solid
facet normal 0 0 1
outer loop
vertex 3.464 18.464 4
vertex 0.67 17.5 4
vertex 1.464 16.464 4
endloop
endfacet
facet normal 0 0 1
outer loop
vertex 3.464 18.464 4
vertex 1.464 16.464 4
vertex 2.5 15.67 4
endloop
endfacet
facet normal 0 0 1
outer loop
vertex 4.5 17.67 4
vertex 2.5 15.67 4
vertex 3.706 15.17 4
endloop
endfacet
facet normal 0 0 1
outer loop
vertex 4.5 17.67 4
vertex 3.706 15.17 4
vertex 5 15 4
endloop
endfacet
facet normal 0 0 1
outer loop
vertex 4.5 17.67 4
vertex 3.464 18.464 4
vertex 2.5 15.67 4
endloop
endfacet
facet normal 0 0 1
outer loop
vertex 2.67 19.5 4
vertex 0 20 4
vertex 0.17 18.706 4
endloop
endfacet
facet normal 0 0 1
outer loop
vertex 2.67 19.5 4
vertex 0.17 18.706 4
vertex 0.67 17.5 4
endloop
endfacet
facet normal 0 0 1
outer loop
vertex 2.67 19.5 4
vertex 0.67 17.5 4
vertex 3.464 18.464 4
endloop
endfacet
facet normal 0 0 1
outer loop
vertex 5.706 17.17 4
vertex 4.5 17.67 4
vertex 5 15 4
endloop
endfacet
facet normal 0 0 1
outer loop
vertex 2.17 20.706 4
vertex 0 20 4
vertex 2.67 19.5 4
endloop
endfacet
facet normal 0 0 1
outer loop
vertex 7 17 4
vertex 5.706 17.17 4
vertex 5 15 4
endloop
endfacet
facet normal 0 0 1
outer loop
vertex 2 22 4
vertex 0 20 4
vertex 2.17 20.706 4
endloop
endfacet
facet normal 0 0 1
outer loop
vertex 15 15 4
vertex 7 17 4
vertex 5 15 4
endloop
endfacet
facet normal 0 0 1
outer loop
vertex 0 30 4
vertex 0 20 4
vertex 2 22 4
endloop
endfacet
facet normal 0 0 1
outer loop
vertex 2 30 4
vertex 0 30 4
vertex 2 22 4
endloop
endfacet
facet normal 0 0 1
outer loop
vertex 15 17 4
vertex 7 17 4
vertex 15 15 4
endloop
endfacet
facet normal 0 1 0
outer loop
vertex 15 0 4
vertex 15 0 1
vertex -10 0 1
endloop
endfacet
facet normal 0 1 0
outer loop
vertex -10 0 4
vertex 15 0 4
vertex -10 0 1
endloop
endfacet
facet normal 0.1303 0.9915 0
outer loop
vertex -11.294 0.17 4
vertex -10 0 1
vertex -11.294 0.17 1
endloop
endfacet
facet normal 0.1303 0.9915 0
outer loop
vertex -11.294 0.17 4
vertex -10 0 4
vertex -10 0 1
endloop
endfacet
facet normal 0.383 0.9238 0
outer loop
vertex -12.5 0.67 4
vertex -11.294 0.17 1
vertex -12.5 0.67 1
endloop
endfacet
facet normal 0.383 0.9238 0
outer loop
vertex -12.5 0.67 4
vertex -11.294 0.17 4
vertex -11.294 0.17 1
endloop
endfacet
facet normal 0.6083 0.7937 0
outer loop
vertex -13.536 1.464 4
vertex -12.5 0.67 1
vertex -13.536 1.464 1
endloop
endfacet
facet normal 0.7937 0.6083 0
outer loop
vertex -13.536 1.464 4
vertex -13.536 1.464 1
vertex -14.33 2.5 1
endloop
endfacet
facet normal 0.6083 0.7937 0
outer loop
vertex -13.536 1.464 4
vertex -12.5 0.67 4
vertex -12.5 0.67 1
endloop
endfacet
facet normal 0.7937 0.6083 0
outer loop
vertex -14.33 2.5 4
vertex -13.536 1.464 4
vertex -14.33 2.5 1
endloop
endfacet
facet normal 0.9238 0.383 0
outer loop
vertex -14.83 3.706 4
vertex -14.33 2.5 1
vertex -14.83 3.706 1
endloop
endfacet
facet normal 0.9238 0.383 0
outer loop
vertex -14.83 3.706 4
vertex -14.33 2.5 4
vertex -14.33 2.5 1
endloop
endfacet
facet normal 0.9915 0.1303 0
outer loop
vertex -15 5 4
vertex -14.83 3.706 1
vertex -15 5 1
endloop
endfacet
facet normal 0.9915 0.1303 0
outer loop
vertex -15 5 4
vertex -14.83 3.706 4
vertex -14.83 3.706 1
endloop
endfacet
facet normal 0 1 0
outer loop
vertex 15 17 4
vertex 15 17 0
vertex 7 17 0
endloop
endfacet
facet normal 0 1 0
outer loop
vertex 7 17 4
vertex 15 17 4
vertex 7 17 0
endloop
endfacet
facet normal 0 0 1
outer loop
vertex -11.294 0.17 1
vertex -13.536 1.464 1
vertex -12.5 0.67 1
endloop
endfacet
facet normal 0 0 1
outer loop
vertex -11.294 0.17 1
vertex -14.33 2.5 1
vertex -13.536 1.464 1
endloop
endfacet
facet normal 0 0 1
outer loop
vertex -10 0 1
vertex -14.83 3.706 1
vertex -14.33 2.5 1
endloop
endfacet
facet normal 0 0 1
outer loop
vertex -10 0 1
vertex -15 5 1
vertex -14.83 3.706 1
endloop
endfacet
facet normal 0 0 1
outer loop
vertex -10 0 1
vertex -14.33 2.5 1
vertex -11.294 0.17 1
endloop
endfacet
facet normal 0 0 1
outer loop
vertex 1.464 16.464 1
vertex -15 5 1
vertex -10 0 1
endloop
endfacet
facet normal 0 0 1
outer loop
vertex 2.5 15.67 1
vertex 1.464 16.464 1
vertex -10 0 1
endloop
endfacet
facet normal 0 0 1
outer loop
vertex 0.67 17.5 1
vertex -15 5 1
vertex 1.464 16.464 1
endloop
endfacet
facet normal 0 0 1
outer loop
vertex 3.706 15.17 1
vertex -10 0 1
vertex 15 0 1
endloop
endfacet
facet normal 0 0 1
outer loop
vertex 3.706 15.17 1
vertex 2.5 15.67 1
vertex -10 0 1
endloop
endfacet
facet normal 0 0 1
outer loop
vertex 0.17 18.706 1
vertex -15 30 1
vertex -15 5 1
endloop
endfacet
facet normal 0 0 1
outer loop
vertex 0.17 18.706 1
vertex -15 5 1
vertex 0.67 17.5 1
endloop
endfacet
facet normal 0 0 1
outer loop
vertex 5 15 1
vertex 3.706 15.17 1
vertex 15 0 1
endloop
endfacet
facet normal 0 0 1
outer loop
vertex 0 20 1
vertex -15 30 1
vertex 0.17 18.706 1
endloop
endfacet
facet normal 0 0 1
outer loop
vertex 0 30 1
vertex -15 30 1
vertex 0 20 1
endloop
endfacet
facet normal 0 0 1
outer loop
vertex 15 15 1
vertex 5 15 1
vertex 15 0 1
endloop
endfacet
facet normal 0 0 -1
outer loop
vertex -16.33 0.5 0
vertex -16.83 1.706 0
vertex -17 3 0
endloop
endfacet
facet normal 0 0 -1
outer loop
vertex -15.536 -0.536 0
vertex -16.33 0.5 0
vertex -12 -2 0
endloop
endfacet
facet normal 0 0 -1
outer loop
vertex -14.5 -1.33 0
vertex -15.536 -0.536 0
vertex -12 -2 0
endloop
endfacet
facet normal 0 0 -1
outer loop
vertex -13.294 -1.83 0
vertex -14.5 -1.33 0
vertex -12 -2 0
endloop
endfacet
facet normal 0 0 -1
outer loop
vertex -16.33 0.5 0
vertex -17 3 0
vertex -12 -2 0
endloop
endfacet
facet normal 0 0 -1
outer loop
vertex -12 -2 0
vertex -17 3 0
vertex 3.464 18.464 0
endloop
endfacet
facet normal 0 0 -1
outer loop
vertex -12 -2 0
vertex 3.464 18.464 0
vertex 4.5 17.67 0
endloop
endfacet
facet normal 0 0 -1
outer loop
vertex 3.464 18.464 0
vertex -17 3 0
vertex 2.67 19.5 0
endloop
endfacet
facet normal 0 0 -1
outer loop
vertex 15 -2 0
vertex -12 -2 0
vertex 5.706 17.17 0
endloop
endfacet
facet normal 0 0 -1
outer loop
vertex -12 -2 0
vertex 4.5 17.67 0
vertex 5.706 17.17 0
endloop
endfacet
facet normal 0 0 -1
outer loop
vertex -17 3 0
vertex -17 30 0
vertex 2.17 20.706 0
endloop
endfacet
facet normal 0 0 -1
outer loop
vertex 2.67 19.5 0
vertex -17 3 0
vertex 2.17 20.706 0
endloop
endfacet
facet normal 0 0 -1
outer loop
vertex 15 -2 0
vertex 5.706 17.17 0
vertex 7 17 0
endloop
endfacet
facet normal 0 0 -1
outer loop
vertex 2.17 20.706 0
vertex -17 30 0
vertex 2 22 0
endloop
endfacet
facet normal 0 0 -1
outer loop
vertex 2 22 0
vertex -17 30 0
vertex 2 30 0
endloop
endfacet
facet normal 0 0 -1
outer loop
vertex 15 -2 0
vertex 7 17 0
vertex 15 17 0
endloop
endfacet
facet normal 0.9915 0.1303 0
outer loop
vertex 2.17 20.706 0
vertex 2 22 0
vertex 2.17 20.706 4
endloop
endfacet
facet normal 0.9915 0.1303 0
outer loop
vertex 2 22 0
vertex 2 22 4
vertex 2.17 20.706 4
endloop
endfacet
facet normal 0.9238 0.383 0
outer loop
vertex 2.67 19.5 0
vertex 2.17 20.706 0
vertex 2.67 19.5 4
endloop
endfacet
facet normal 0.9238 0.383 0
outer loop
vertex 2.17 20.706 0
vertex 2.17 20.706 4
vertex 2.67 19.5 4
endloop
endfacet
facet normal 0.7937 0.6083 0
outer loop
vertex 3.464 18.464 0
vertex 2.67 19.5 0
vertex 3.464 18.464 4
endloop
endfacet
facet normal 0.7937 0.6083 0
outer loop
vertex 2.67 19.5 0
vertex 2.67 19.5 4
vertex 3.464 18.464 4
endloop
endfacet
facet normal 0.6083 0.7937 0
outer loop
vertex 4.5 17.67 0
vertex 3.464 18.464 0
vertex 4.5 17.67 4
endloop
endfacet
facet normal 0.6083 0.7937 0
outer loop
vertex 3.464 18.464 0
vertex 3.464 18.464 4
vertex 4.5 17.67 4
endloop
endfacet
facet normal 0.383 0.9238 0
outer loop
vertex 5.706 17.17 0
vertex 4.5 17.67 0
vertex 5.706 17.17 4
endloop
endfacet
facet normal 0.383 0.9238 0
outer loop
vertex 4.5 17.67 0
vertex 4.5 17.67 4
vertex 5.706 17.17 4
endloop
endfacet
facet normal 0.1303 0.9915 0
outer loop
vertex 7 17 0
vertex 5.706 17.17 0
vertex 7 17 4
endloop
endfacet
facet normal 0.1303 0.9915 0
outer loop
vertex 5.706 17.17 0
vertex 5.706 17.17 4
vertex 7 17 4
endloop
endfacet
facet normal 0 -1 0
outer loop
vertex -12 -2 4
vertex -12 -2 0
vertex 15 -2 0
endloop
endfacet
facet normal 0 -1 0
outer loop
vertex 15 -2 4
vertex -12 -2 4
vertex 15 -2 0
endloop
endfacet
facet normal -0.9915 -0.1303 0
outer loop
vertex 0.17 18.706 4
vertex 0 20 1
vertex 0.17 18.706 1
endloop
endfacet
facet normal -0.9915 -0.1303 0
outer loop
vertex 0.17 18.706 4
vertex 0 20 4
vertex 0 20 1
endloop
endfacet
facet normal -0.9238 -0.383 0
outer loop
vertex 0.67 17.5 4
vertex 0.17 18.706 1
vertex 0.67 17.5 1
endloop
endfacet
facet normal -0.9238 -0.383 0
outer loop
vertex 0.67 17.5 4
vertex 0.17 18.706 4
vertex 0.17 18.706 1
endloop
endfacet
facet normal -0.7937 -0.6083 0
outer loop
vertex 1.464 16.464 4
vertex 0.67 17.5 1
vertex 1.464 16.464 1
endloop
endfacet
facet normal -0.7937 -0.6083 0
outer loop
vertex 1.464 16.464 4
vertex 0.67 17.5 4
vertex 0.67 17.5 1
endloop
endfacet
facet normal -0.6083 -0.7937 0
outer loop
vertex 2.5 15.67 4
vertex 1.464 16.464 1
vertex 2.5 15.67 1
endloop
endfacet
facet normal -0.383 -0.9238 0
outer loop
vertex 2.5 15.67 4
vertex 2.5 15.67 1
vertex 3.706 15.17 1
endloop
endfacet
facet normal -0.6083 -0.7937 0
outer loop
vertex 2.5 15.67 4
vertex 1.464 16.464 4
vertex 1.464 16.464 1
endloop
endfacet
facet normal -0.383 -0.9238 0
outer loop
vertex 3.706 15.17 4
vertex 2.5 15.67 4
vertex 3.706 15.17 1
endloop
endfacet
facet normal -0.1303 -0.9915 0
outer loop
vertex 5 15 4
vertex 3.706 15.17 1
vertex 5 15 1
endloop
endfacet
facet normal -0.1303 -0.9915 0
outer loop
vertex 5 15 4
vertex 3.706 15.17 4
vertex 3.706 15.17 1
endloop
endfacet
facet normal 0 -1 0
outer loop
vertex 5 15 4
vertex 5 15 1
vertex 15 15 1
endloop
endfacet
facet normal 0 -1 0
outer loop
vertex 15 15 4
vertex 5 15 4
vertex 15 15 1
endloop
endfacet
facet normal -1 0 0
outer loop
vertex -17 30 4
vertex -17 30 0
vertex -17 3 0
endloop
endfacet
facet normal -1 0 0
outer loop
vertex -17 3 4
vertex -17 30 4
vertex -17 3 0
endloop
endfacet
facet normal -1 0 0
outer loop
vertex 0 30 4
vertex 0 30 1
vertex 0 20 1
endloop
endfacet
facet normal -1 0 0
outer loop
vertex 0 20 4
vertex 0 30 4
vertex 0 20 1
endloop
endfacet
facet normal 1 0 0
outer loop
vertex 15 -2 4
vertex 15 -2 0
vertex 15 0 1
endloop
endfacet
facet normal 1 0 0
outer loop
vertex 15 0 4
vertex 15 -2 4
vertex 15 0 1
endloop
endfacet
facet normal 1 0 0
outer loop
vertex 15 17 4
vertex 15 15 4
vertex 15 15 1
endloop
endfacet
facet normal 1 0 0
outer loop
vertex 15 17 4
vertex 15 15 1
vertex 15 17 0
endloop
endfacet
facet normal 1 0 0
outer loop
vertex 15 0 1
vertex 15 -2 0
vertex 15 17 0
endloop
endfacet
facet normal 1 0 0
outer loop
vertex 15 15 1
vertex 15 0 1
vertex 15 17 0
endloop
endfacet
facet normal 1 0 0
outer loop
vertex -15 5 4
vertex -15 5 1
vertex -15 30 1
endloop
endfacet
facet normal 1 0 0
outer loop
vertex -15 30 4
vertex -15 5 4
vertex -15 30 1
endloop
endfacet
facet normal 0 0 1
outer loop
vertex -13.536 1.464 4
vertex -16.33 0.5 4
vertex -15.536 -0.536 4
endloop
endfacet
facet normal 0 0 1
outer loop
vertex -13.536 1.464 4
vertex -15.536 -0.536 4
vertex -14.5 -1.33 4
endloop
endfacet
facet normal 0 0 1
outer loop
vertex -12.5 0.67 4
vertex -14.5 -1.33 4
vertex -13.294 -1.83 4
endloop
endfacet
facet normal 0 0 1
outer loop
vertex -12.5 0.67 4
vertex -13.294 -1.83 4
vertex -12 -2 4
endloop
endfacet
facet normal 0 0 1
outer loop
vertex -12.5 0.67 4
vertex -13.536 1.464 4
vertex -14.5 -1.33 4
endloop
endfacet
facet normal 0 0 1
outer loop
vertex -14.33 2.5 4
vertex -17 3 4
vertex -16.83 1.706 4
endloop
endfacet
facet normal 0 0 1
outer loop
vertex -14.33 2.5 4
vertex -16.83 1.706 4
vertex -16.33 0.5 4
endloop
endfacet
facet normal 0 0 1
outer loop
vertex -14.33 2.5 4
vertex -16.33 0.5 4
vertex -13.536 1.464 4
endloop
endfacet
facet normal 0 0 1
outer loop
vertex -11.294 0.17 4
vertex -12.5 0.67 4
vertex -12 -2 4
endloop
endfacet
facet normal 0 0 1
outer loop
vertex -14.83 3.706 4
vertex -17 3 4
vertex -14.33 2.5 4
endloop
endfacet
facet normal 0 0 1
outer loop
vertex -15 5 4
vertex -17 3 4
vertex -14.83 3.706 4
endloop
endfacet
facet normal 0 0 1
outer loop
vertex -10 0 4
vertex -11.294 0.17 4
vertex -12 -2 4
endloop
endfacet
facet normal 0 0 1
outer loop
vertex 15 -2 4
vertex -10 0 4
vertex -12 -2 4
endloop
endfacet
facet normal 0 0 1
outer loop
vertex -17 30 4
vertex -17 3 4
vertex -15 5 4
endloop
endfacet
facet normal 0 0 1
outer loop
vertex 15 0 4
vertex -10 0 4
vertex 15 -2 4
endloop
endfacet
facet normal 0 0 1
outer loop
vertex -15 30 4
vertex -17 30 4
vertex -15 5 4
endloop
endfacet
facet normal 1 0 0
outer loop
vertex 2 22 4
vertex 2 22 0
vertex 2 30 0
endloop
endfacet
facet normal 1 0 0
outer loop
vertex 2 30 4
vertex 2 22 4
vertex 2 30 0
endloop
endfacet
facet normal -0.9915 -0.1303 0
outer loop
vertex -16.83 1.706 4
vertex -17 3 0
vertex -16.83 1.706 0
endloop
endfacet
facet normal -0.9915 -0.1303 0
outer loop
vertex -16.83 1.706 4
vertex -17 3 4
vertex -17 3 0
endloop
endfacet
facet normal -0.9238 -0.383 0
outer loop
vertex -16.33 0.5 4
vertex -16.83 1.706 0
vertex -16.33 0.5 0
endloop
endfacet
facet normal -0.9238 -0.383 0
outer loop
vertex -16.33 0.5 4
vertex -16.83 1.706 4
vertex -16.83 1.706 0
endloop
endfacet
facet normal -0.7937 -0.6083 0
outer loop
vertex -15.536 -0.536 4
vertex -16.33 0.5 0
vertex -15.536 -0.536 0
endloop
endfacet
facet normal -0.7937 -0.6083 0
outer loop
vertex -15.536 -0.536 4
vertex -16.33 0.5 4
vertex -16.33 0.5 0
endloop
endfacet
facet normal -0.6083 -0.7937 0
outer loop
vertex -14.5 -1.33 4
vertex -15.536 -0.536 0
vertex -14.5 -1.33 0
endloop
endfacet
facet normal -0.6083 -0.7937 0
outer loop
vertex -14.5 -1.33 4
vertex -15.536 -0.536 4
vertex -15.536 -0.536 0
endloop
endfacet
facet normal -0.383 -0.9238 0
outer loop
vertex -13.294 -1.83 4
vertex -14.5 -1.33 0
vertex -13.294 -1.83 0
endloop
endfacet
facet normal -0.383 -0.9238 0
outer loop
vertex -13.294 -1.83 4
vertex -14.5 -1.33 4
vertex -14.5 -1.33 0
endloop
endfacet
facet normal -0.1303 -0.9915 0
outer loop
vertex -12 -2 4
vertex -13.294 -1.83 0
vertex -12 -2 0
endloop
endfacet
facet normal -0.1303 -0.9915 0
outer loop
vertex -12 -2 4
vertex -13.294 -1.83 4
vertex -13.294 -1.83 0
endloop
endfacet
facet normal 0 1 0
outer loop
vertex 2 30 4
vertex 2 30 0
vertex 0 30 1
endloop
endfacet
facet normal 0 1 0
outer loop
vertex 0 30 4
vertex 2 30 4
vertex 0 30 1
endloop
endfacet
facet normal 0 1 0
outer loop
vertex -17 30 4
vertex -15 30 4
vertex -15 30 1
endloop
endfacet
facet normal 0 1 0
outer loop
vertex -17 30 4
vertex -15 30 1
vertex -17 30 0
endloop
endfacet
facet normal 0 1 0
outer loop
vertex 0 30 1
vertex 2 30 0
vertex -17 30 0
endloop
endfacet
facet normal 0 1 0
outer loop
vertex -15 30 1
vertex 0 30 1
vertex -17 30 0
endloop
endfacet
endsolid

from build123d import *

# Parameters (mm, degrees)
F1_DEPTH = 1
F2_DEPTH = 4
F3_R     = 5


with BuildPart() as f1:
    # F0 (on Top) → F1 (new body)
    with BuildSketch(Plane.XY):
        Polygon((-15, 0), (0, 0), (15, 0), (15, 15), (0, 15), (0, 30), (-15, 30), align=None)
    extrude(amount=F1_DEPTH)

    # F0 (on Top) → F2 (join)
    with BuildSketch(Plane.XY):
        Polygon((15, 0), (0, 0), (-15, 0), (-15, 30), (-17, 30), (-17, -2), (0, -2), (15, -2), align=None)
        Polygon((0, 15), (15, 15), (15, 17), (2, 17), (2, 30), (0, 30), align=None)
    extrude(amount=F2_DEPTH)

    # F3
    f3_edges = [f1.edges().sort_by_distance(p)[0] for p in [
        (0, 15, 2.5),
        (-17, -2, 2),
        (2, 17, 2),
        (-15, 0, 2.5),
    ]]
    fillet(f3_edges, radius=F3_R)


solid = f1.part
